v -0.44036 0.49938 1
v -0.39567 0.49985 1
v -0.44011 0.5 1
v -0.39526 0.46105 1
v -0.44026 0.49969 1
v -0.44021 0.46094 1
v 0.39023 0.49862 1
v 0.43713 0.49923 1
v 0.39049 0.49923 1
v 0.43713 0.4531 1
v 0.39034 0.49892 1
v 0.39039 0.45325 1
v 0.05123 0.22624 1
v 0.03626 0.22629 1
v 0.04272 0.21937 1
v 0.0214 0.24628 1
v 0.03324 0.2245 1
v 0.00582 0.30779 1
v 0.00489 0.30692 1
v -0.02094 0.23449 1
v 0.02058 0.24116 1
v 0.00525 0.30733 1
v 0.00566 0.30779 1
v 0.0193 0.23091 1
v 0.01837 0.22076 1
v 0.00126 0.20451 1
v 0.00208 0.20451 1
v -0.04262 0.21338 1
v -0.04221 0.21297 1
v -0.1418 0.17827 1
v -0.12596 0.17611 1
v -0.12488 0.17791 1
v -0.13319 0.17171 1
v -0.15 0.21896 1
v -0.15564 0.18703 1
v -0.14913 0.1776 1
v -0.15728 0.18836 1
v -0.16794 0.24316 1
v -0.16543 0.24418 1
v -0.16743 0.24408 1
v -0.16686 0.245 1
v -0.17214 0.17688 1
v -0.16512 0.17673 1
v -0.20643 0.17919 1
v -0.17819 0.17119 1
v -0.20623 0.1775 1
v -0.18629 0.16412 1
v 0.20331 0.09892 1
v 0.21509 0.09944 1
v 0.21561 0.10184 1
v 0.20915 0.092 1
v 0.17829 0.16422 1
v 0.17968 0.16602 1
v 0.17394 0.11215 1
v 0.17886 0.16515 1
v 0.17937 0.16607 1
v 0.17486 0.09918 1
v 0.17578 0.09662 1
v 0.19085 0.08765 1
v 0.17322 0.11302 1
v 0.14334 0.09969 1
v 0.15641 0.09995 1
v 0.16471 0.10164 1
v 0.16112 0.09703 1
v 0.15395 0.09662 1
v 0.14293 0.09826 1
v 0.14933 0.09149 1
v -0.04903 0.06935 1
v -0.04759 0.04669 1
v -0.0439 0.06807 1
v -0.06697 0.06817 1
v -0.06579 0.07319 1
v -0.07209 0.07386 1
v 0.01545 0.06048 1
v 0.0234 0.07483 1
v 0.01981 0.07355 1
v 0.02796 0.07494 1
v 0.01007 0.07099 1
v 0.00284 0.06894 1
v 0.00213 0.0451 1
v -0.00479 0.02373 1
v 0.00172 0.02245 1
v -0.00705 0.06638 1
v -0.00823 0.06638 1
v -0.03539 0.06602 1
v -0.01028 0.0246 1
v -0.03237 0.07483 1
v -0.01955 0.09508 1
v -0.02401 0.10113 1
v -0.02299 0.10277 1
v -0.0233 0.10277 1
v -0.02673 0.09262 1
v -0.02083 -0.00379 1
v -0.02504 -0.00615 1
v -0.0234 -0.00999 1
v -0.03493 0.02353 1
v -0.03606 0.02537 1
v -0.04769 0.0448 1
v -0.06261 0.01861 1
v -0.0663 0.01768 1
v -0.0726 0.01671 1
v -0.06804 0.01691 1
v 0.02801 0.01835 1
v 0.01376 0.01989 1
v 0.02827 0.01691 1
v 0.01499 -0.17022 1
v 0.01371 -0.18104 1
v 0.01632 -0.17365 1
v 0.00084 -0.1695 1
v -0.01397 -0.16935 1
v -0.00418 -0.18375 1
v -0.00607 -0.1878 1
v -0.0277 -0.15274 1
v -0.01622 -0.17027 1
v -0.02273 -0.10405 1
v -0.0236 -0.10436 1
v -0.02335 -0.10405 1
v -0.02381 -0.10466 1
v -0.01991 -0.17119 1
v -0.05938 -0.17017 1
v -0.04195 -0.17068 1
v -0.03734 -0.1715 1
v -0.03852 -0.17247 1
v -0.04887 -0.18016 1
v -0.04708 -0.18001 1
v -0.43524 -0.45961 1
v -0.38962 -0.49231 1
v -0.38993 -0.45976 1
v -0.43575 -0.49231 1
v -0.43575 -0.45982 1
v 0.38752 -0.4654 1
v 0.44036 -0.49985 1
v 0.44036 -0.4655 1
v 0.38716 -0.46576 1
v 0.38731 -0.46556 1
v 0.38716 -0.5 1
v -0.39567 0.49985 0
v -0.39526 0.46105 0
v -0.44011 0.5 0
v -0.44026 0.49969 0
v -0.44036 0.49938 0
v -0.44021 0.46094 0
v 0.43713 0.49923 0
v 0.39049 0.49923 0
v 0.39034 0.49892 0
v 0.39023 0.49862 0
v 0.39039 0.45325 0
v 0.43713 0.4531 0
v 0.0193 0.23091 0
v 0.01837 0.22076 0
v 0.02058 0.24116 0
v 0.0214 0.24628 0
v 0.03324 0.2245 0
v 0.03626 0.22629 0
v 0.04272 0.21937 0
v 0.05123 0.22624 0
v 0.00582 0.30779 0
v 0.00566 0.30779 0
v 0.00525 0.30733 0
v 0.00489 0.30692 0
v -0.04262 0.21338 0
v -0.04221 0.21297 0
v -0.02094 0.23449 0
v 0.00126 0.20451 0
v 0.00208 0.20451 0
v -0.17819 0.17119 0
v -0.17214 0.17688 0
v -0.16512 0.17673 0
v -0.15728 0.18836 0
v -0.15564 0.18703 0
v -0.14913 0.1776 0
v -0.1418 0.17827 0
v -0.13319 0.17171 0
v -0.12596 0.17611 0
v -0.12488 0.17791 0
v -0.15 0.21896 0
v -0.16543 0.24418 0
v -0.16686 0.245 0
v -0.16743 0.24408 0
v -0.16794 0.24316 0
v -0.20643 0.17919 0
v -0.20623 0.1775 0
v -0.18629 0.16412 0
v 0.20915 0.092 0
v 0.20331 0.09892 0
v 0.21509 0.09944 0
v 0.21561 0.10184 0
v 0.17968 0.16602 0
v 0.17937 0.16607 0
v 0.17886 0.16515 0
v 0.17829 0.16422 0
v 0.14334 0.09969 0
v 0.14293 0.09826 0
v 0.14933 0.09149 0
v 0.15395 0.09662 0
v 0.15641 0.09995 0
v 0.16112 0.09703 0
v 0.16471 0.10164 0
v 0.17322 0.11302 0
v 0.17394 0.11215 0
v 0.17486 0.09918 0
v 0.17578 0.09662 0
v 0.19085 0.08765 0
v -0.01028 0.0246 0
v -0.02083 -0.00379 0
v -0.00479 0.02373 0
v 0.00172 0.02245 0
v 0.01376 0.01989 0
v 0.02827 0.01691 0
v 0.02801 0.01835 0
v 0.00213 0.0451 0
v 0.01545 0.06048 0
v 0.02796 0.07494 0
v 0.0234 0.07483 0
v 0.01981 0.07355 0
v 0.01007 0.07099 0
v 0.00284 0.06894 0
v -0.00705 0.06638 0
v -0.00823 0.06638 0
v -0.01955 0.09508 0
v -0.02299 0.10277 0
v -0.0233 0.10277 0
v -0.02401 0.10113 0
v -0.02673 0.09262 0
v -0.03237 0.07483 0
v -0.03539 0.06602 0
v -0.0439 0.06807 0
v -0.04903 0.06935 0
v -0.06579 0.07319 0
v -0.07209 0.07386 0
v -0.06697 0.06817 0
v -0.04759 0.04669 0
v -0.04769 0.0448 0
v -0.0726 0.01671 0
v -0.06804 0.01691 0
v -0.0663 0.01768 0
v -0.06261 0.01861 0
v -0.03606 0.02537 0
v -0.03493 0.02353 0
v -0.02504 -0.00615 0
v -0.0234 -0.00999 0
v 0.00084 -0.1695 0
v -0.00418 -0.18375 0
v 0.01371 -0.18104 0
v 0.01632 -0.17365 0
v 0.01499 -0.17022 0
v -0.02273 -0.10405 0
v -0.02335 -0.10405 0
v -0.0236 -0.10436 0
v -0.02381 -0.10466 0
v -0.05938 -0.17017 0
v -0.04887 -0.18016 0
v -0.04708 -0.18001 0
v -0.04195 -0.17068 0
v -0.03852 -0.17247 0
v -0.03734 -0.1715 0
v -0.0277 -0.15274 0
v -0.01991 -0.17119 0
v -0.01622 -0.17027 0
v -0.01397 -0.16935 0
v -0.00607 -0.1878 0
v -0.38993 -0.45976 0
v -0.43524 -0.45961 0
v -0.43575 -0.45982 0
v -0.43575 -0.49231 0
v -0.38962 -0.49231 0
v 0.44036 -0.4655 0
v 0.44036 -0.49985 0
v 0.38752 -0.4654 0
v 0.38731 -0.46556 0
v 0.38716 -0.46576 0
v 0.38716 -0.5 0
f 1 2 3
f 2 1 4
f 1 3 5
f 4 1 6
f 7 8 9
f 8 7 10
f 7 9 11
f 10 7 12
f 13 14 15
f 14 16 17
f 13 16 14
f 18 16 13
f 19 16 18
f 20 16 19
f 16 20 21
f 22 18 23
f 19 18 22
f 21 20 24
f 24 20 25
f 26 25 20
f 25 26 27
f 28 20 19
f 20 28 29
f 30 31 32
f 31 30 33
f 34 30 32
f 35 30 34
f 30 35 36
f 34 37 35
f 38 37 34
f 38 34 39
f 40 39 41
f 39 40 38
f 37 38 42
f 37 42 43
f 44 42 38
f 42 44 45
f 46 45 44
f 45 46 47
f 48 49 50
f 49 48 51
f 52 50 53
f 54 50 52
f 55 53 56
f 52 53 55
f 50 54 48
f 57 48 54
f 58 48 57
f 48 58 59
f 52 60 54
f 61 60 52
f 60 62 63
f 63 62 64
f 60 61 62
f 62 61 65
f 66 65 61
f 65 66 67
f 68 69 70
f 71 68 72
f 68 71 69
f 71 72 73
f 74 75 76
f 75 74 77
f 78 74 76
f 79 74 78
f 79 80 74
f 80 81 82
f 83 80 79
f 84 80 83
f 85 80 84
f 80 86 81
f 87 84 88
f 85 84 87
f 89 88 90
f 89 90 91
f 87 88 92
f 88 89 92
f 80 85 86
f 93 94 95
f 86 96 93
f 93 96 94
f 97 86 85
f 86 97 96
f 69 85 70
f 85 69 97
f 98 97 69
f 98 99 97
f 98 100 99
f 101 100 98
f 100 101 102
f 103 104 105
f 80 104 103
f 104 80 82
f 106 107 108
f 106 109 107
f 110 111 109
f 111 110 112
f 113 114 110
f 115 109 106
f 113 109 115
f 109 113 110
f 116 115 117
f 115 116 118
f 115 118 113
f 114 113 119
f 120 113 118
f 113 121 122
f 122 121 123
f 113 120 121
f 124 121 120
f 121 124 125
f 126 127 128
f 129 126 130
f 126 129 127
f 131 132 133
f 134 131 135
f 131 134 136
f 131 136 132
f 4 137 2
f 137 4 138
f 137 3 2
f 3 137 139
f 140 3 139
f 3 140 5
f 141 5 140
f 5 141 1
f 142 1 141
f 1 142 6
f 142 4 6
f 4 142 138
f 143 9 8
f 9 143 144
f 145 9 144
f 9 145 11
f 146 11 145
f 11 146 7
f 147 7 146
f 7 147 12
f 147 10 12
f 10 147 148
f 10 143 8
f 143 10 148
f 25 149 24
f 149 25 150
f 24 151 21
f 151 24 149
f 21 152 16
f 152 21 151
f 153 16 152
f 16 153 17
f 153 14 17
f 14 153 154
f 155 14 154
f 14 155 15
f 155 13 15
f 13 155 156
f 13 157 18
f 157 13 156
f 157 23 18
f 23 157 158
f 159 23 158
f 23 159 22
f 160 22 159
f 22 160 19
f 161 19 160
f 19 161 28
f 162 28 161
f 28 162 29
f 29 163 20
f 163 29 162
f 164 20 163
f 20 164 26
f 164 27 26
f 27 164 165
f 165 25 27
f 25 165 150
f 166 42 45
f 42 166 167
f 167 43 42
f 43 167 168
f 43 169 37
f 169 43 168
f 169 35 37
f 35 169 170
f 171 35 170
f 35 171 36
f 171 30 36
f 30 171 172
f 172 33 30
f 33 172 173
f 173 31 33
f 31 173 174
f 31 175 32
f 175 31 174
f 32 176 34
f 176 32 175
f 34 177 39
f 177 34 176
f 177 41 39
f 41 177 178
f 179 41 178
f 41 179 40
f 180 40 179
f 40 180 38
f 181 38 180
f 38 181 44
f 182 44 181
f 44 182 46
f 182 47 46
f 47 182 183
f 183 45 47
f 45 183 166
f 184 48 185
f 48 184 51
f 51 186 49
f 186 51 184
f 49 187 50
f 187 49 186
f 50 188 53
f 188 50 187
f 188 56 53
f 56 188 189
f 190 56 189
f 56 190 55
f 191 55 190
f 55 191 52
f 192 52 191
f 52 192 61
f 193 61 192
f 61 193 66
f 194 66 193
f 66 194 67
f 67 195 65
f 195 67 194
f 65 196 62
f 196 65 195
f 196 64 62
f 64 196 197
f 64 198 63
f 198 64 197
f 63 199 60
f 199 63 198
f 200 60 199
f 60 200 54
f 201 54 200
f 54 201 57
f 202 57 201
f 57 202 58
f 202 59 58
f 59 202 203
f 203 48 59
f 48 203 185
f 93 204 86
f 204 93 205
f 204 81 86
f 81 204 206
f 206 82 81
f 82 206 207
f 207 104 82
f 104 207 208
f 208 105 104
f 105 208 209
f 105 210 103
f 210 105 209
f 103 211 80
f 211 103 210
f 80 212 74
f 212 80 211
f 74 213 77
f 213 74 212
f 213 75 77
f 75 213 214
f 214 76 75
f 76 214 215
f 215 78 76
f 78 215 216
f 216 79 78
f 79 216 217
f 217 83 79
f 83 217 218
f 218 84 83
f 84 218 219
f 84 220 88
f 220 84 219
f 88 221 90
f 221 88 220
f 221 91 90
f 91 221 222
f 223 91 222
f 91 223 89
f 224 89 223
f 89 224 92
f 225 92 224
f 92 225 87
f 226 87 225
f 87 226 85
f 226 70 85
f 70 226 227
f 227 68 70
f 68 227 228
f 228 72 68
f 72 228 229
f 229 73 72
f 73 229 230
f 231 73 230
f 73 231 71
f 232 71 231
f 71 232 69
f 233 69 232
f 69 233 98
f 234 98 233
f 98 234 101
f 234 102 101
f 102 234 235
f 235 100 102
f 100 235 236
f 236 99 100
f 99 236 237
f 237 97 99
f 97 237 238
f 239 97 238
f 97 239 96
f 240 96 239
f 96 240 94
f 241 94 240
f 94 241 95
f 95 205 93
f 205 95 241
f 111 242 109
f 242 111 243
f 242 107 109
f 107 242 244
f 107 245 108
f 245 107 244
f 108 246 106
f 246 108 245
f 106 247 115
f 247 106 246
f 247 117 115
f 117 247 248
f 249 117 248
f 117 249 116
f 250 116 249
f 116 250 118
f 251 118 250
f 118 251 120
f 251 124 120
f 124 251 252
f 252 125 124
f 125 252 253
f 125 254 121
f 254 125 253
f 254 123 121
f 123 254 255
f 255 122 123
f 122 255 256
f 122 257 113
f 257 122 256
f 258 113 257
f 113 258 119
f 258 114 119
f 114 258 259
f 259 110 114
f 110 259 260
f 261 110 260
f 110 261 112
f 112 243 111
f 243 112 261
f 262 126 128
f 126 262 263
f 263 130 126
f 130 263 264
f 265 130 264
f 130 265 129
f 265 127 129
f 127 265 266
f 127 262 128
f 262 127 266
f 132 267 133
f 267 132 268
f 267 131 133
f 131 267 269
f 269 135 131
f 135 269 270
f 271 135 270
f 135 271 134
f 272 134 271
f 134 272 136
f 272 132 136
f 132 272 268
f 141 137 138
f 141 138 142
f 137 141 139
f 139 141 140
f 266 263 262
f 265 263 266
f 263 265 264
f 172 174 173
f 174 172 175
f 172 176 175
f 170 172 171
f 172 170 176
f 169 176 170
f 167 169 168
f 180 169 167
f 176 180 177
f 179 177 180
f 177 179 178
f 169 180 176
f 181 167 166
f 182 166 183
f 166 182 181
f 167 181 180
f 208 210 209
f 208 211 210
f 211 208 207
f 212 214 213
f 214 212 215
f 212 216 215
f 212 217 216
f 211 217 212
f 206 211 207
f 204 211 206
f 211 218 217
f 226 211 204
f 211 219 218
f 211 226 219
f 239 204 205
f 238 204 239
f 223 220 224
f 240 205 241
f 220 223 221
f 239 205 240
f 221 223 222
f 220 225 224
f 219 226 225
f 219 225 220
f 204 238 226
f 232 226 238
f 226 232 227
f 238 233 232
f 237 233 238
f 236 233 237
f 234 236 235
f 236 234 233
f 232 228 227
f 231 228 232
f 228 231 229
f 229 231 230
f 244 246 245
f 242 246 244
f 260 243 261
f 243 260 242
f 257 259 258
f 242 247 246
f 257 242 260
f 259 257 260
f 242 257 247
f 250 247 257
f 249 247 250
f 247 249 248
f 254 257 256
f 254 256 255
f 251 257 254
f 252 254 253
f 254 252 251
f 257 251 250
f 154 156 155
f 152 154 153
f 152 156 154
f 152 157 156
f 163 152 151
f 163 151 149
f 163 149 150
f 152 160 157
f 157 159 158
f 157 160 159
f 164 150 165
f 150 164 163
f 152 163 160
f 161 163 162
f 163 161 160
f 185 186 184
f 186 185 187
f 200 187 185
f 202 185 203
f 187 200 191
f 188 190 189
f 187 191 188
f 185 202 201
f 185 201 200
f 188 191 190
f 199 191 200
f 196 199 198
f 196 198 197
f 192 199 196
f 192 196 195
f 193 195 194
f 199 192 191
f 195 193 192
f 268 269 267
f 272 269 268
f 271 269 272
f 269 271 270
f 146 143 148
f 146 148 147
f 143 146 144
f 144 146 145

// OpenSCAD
module WibbyWhite_1()
{
 /* Generated by trace2scad version 20150415
    http://aggregate.org/MAKE/TRACE2SCAD/
    Optimized model has 139/1729 original points
 */
 color([0.5, 0.5, 0.5])
 assign(minx=285) /* polygon minx=285 */
 assign(miny=200) /* polygon miny=200 */
 assign(maxx=17468) /* polygon maxx=17468 */
 assign(maxy=19710) /* polygon maxy=19710 */
 assign(dx=maxx-minx)
 assign(dy=maxy-miny)
 assign(maxd=((dx>dy)?dx:dy))
 scale([1/maxd, 1/maxd, 1])
 translate([-minx-dx/2, -miny-dy/2, 0])
 linear_extrude(height=1, convexity=139)
 union() {
  union() {
   polygon([[287,19704],[285,19698],[288,18948],[1165,18950],[1157,19707],[290,19710]], convexity=6);
   polygon([[16492,19689],[16490,19683],[16493,18798],[17405,18795],[17405,19695],[16495,19695]], convexity=6);
   polygon([[8979,15951],[8972,15943],[8045,14118],[8053,14110],[8468,14530],[8901,13945],[8917,13945],[9235,14262],[9253,14460],[9278,14660],[9294,14760],[9525,14335],[9584,14370],[9710,14235],[9876,14369],[8990,15960],[8987,15960]], convexity=12);
   polygon([[5610,14717],[5600,14699],[4849,13451],[4853,13418],[5242,13157],[5400,13295],[5518,13406],[5655,13403],[5808,13630],[5840,13604],[5967,13420],[6110,13433],[6278,13305],[6419,13391],[6440,13426],[5950,14227],[5649,14719],[5621,14735]], convexity=12);
   polygon([[12366,13177],[12355,13159],[11673,11900],[11665,11872],[11790,11740],[11880,11840],[11928,11905],[12020,11848],[12090,11938],[12256,12160],[12270,12143],[12288,11890],[12306,11840],[12600,11665],[12843,11885],[12957,11750],[13073,11895],[13083,11942],[12382,13194],[12376,13195]], convexity=12);
   polygon([[8415,11944],[8408,11928],[8355,11762],[8245,11415],[8186,11243],[8020,11283],[7920,11308],[7593,11383],[7470,11396],[7570,11285],[7948,10866],[7946,10829],[7460,10281],[7549,10285],[7583,10300],[7655,10318],[8173,10450],[8195,10414],[8288,10135],[8388,9835],[8420,9760],[8470,9881],[8676,10435],[8783,10418],[8910,10393],[9145,10343],[9428,10285],[9423,10313],[8918,10835],[9178,11135],[9422,11417],[9333,11415],[9263,11390],[9073,11340],[8932,11300],[8739,11250],[8716,11250],[8495,11810],[8428,11960],[8422,11960]], convexity=14);
   polygon([[8416,7919],[8412,7913],[7718,6635],[7923,6440],[7958,6443],[8058,6625],[8125,6590],[8148,6609],[8336,6975],[8488,6615],[8560,6633],[8604,6651],[8758,6291],[8795,6370],[8893,6648],[9144,6423],[9195,6567],[9169,6634],[8433,7925],[8421,7925]], convexity=14);
   polygon([[380,986],[375,984],[375,350],[1275,350],[1269,985],[385,988]], convexity=6);
   polygon([[16433,872],[16430,868],[16430,200],[17468,203],[17468,873],[16437,875]], convexity=6);
  }
 }
}

module WibbyWhite()
{
 /* all layers combined, scaled to within a 1mm cube */
 scale([1, 1, 1/1])
 difference() {
  union() {
   scale([1,1,2]) translate([0,0,-0.5]) WibbyWhite_1();
  }
  translate([0,0,-2]) cube([2,2,4],center=true);
 }
}
WibbyWhite();
